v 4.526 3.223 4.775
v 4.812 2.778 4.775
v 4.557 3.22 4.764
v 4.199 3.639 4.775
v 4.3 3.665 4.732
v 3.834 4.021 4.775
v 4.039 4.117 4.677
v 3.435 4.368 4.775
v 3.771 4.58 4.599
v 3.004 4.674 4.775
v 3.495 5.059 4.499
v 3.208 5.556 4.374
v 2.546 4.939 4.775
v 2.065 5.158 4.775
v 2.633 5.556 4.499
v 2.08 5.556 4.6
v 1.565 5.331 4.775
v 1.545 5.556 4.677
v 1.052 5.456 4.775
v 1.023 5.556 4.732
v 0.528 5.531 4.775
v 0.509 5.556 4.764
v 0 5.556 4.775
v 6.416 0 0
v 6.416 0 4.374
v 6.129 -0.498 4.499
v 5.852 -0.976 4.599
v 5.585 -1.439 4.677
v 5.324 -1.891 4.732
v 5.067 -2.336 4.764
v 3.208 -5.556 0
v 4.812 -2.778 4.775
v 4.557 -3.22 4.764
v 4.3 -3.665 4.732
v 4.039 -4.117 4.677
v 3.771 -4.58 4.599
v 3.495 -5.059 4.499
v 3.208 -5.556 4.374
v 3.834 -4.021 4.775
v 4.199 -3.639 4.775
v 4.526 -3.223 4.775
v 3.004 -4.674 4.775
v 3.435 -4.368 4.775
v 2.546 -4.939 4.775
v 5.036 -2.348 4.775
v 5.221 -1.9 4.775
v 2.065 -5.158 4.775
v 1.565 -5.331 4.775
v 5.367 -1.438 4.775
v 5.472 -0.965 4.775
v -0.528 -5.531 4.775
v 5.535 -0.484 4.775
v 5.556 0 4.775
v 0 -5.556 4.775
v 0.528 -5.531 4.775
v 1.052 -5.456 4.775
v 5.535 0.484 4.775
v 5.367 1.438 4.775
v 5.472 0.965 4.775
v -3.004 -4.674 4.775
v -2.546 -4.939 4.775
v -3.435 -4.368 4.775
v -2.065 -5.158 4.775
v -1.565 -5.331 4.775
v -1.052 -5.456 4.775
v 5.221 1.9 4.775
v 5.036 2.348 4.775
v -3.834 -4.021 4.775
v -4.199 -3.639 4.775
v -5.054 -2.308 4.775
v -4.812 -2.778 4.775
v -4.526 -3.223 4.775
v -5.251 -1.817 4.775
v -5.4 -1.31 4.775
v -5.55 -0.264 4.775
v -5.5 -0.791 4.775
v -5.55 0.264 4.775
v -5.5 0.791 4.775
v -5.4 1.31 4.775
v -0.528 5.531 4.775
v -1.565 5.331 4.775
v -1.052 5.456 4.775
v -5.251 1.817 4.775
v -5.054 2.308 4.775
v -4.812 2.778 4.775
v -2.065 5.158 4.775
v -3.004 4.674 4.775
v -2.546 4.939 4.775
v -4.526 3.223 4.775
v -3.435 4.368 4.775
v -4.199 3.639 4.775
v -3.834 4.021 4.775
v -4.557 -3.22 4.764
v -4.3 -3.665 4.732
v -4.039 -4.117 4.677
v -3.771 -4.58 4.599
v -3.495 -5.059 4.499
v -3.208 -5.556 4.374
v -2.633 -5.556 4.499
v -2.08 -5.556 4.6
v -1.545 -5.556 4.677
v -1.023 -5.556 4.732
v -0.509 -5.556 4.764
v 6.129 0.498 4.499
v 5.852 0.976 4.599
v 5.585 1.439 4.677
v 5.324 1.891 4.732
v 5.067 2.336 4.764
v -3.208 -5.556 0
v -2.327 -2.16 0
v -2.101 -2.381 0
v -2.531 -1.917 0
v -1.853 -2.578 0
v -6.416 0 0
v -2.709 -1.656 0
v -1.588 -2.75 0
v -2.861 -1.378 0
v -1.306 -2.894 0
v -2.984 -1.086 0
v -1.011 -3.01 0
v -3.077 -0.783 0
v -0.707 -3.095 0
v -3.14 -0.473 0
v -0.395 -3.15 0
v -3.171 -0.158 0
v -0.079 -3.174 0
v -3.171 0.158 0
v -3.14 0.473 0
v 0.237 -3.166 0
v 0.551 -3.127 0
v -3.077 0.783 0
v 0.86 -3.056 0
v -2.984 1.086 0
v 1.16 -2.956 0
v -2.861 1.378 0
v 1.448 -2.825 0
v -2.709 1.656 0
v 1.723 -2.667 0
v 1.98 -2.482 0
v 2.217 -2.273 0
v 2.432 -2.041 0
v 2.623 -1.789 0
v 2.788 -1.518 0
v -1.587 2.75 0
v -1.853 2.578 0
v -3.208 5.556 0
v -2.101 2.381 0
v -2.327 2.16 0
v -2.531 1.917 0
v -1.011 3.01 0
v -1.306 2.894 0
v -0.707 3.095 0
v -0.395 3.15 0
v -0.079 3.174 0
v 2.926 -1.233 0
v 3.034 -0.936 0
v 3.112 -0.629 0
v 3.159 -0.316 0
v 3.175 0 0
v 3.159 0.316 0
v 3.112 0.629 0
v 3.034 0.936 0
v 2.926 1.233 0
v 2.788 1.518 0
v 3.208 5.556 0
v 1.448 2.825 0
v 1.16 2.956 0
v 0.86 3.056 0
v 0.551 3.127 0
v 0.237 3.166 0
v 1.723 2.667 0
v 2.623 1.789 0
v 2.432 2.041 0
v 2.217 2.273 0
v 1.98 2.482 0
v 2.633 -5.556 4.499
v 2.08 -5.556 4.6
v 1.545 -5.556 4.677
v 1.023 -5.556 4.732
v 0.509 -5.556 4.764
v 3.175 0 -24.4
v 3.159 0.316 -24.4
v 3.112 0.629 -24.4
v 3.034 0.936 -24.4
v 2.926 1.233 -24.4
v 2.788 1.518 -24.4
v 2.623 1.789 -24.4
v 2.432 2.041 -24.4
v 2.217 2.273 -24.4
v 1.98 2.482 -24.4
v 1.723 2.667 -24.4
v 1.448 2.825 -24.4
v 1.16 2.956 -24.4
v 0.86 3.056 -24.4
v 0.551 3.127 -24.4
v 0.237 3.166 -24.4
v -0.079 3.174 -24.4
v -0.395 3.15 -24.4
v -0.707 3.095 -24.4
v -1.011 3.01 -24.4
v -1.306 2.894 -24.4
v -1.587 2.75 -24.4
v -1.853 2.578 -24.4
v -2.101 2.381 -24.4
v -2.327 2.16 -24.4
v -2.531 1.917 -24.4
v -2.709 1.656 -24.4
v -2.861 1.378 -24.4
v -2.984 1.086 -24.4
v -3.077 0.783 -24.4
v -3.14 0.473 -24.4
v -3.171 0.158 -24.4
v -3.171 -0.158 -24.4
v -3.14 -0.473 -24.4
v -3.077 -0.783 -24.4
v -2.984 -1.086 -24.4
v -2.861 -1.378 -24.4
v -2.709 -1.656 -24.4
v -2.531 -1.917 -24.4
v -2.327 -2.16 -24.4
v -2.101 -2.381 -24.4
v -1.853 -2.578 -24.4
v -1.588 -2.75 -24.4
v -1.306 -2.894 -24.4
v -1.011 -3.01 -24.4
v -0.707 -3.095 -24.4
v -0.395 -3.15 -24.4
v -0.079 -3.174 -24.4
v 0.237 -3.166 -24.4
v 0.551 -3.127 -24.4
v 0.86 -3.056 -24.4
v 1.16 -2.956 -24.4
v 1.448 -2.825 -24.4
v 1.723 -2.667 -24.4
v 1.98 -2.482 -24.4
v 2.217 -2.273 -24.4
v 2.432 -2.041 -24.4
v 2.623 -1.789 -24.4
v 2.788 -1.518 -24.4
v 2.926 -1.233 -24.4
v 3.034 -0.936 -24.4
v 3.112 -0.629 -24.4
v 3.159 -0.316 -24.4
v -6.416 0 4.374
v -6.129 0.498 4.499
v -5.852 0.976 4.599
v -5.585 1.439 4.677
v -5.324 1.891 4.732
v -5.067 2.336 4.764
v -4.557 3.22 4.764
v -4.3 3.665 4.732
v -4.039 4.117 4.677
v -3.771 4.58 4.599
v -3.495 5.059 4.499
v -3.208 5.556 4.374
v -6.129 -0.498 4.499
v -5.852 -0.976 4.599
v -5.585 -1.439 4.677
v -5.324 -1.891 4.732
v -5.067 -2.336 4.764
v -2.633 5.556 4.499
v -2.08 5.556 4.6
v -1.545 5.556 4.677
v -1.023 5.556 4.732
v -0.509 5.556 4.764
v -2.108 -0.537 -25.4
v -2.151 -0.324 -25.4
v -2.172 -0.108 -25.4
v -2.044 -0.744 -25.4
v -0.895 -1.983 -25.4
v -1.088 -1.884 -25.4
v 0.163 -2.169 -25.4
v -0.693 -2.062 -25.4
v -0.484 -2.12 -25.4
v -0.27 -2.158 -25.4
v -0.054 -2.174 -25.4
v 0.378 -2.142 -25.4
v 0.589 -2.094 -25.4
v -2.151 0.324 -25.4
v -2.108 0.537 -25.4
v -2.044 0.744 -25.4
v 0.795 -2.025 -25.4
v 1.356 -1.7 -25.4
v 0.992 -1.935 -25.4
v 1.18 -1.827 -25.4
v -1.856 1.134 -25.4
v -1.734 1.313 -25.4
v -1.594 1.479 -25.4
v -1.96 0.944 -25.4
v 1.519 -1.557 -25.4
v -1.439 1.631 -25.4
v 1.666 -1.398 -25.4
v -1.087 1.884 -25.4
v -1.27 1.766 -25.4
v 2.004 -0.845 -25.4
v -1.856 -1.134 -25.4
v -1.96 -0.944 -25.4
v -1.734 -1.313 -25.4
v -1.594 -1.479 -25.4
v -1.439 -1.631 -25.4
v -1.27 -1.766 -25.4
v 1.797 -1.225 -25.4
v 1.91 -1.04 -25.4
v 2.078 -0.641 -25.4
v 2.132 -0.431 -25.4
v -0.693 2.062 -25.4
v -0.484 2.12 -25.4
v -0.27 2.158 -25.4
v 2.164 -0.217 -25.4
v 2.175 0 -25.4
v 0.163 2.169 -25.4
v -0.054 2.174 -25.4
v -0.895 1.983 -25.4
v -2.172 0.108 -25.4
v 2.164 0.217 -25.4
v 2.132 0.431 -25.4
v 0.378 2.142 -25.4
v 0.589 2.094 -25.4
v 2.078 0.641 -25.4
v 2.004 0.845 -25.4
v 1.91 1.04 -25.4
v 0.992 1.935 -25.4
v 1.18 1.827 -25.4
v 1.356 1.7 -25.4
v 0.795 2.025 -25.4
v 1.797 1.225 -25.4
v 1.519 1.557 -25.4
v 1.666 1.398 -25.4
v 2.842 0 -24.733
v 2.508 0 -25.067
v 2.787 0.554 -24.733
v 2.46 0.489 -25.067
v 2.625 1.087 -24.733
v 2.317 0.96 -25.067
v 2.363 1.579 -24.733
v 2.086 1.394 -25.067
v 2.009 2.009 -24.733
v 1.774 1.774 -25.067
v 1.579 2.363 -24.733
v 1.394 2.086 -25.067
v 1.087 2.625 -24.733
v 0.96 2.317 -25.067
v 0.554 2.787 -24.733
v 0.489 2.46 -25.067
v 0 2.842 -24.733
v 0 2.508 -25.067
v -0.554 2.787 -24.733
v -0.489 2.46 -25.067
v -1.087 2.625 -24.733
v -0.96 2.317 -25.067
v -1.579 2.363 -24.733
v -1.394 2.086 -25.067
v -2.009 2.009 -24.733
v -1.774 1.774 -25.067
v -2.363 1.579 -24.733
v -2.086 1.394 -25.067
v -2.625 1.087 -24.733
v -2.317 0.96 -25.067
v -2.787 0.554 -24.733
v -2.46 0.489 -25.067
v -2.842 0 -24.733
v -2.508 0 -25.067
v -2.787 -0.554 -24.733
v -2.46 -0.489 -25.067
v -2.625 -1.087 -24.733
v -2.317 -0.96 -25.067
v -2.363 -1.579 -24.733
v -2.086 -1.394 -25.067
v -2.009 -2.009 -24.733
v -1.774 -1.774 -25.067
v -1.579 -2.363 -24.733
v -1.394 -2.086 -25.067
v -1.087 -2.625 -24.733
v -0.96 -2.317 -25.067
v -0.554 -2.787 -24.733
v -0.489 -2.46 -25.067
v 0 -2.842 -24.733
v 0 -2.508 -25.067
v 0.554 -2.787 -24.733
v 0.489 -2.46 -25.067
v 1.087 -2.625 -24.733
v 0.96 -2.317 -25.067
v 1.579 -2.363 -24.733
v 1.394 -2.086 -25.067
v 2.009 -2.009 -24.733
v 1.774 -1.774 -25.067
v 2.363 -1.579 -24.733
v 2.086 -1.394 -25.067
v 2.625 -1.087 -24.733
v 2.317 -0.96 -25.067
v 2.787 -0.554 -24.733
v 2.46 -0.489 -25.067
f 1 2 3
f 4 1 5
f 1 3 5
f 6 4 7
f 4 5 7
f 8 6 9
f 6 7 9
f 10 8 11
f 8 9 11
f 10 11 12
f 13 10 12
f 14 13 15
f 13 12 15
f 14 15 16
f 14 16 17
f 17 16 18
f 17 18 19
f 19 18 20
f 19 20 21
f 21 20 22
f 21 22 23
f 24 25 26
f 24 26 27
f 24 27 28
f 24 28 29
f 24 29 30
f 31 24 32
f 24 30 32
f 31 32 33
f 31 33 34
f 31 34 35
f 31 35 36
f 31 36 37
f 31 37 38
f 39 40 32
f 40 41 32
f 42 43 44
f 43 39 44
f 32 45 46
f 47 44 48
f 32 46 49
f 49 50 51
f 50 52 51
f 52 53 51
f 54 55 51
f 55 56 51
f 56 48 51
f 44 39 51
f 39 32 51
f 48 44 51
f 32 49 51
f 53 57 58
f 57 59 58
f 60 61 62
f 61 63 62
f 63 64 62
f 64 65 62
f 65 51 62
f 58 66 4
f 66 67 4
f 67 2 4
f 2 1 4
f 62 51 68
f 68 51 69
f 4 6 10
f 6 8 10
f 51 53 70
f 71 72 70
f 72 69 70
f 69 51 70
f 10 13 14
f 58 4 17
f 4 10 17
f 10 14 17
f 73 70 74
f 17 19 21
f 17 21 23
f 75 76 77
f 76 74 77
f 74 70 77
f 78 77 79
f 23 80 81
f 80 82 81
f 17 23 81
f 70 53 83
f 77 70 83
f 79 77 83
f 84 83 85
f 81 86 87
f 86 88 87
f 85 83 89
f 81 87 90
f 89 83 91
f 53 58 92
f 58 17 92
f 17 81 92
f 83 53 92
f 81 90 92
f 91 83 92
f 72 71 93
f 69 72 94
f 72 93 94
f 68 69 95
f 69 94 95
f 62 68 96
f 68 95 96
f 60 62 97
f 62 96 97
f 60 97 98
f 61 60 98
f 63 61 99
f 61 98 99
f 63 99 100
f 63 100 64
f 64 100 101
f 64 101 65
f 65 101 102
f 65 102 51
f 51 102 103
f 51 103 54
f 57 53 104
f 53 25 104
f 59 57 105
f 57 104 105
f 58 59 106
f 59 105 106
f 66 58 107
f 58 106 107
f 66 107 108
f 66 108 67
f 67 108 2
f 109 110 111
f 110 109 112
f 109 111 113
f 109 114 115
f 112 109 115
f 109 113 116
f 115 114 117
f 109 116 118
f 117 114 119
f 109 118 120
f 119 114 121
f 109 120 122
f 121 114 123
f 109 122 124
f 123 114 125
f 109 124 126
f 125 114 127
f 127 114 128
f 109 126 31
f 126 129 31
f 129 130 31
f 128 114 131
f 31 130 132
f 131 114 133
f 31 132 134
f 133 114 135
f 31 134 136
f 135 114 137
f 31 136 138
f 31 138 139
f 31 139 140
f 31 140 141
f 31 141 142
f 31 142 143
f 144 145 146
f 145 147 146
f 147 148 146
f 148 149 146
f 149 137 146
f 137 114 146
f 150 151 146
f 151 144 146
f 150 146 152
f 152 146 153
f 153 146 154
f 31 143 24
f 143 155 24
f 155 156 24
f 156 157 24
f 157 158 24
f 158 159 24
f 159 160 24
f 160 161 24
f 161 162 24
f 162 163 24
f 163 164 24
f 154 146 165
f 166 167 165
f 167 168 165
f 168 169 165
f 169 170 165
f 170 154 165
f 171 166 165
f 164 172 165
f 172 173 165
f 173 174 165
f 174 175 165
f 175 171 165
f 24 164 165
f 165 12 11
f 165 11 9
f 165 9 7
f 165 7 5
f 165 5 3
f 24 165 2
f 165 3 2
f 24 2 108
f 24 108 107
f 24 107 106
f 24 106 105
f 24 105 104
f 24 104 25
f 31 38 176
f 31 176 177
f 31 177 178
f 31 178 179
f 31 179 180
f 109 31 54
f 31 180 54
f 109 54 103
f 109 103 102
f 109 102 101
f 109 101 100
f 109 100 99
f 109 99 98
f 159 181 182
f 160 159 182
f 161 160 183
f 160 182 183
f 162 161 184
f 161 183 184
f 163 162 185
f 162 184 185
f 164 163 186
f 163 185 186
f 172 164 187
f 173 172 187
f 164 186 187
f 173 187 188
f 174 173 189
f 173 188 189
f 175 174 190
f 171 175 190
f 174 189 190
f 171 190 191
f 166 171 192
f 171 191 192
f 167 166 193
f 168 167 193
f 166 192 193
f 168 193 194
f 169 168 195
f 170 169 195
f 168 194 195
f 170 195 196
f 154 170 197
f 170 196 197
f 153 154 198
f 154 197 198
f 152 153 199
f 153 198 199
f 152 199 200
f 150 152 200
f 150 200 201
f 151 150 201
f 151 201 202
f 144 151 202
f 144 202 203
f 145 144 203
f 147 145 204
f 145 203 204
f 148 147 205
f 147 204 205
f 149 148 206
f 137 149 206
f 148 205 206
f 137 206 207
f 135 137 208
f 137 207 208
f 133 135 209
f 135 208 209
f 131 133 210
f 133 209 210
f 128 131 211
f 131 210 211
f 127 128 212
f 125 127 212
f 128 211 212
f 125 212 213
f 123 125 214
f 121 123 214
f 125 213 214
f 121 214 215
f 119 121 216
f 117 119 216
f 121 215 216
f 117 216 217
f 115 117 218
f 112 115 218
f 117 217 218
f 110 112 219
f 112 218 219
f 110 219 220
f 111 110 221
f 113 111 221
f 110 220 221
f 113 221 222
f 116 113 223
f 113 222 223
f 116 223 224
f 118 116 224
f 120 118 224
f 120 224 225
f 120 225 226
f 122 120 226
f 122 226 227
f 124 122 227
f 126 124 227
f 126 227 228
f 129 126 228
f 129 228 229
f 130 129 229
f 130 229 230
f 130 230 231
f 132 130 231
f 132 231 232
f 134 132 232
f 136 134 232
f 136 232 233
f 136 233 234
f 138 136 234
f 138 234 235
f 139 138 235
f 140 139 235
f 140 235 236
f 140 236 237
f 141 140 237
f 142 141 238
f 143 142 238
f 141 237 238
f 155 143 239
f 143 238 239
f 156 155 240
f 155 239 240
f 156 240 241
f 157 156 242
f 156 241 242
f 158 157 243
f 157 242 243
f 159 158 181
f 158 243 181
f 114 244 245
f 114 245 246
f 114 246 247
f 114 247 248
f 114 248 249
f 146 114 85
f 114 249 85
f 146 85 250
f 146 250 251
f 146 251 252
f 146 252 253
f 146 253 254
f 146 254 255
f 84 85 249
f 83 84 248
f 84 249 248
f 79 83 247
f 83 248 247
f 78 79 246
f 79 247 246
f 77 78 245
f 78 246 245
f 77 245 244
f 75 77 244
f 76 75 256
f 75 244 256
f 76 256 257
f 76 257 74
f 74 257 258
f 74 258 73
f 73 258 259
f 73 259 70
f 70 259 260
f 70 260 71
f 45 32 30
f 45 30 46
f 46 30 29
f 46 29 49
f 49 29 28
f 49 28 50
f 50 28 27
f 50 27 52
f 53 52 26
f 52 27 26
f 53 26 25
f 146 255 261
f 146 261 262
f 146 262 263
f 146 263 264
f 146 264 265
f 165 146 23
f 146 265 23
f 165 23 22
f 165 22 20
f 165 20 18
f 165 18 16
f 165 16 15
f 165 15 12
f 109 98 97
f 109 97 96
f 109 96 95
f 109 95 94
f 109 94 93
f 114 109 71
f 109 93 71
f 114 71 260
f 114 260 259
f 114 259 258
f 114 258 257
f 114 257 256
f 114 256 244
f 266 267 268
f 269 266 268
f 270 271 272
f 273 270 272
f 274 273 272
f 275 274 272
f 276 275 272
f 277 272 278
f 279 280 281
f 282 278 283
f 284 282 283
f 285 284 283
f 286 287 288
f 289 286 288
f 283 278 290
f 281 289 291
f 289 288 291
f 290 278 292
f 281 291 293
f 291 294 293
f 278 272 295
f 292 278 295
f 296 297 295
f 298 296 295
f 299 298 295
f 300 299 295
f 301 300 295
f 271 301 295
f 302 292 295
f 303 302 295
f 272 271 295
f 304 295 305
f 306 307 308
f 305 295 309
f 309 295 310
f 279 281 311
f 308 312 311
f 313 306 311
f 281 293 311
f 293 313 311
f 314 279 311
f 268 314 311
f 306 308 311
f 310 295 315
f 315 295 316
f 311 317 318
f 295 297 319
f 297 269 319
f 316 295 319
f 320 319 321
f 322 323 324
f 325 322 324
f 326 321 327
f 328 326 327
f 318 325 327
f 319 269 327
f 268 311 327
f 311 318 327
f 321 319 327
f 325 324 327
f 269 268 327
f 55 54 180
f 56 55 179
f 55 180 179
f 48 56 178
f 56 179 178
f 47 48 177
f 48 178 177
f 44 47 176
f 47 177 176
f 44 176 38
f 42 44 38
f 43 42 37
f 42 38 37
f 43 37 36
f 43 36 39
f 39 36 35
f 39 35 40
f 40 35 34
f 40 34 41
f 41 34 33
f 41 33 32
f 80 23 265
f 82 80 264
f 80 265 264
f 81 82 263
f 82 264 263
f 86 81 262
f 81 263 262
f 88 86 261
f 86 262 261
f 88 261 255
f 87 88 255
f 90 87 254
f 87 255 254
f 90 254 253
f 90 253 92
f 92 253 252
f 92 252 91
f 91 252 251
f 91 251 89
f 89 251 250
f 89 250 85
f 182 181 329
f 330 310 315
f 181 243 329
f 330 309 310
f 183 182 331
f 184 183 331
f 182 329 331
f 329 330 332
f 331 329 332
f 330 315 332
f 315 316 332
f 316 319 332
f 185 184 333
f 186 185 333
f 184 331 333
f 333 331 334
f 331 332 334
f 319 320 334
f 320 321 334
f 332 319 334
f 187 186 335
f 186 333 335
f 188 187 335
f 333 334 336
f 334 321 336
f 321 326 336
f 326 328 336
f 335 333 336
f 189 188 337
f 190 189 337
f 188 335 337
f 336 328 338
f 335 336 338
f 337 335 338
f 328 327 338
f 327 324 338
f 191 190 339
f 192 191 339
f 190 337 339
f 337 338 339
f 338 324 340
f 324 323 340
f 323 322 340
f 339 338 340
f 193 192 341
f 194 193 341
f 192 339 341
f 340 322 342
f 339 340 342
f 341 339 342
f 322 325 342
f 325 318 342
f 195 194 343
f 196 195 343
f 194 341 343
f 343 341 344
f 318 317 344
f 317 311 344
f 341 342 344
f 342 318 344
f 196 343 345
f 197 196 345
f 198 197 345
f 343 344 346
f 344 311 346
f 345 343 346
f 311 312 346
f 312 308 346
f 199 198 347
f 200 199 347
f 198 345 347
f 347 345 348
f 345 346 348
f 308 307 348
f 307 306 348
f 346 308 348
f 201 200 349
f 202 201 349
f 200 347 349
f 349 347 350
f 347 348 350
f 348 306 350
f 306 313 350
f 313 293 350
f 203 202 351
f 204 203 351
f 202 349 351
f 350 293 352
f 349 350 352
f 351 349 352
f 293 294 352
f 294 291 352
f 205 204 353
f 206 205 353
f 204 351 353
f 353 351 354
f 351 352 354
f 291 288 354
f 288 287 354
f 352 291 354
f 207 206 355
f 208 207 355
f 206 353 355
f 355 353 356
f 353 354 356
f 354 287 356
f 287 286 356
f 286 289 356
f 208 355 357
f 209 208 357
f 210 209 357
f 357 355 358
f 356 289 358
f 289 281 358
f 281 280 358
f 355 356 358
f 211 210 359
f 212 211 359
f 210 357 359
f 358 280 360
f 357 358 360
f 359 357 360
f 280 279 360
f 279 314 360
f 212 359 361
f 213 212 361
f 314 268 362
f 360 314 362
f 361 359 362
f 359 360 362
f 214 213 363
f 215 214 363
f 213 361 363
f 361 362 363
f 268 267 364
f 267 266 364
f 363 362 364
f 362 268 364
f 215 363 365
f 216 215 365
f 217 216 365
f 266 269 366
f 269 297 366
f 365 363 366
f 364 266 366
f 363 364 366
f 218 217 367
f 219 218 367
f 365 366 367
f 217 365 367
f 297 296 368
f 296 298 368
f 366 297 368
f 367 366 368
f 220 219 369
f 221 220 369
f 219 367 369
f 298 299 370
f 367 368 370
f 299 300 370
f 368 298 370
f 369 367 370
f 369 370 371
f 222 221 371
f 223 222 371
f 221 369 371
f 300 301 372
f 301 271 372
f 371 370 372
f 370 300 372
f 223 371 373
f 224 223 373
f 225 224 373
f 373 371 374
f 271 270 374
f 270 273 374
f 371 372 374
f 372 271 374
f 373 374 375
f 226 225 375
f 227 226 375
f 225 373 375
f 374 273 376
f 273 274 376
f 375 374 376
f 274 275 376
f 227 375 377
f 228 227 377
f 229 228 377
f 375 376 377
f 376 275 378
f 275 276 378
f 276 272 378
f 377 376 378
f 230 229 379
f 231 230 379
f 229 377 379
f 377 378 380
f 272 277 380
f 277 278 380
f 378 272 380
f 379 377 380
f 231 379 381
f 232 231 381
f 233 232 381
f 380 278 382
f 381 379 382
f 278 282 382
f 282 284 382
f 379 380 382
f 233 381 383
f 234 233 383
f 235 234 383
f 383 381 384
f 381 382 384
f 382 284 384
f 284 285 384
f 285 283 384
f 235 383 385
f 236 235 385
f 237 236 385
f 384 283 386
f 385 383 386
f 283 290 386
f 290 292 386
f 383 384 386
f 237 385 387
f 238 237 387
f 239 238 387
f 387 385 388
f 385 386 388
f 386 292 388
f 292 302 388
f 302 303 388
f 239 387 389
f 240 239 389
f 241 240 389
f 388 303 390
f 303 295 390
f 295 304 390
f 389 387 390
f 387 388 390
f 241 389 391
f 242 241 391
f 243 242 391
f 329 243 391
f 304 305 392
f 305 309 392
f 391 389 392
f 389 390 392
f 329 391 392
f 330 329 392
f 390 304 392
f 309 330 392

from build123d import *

# Parameters (mm, degrees)
SKETCH001_R  = 7.415805
POCKET_DEPTH = 30.1762
CHAMFER_SIZE = 1


with BuildPart() as part:
    # Sketch → Revolution (revolve)
    with BuildSketch(Plane.XZ):
        Polygon((0, 4.7752), (5.55625, 4.7752), (6.4158, 4.374385), (6.4158, 0), (3.175, 0), (3.175, -25.4), (0, -25.4), align=None)
    revolve(axis=Axis((0, 0, 0), (0, 0, 1)))

    # Sketch001 → Pocket (cut, through all)
    with BuildSketch(Plane(origin=(0, 0, 4.7752), x_dir=(-1, 0, 0), z_dir=(0, 0, 1))):
        Circle(SKETCH001_R)
        Polygon((-3.207902, 5.55625), (3.207902, 5.55625), (6.415805, 0), (3.207902, -5.55625), (-3.207902, -5.55625), (-6.415805, 0), align=None, mode=Mode.SUBTRACT)
    extrude(amount=-POCKET_DEPTH, mode=Mode.SUBTRACT)

    # Chamfer
    chamfer_edges = [part.edges().sort_by_distance(p)[0] for p in [
        (-3.175, 0, -25.4),
    ]]
    chamfer(chamfer_edges, length=CHAMFER_SIZE)


solid = part.part
